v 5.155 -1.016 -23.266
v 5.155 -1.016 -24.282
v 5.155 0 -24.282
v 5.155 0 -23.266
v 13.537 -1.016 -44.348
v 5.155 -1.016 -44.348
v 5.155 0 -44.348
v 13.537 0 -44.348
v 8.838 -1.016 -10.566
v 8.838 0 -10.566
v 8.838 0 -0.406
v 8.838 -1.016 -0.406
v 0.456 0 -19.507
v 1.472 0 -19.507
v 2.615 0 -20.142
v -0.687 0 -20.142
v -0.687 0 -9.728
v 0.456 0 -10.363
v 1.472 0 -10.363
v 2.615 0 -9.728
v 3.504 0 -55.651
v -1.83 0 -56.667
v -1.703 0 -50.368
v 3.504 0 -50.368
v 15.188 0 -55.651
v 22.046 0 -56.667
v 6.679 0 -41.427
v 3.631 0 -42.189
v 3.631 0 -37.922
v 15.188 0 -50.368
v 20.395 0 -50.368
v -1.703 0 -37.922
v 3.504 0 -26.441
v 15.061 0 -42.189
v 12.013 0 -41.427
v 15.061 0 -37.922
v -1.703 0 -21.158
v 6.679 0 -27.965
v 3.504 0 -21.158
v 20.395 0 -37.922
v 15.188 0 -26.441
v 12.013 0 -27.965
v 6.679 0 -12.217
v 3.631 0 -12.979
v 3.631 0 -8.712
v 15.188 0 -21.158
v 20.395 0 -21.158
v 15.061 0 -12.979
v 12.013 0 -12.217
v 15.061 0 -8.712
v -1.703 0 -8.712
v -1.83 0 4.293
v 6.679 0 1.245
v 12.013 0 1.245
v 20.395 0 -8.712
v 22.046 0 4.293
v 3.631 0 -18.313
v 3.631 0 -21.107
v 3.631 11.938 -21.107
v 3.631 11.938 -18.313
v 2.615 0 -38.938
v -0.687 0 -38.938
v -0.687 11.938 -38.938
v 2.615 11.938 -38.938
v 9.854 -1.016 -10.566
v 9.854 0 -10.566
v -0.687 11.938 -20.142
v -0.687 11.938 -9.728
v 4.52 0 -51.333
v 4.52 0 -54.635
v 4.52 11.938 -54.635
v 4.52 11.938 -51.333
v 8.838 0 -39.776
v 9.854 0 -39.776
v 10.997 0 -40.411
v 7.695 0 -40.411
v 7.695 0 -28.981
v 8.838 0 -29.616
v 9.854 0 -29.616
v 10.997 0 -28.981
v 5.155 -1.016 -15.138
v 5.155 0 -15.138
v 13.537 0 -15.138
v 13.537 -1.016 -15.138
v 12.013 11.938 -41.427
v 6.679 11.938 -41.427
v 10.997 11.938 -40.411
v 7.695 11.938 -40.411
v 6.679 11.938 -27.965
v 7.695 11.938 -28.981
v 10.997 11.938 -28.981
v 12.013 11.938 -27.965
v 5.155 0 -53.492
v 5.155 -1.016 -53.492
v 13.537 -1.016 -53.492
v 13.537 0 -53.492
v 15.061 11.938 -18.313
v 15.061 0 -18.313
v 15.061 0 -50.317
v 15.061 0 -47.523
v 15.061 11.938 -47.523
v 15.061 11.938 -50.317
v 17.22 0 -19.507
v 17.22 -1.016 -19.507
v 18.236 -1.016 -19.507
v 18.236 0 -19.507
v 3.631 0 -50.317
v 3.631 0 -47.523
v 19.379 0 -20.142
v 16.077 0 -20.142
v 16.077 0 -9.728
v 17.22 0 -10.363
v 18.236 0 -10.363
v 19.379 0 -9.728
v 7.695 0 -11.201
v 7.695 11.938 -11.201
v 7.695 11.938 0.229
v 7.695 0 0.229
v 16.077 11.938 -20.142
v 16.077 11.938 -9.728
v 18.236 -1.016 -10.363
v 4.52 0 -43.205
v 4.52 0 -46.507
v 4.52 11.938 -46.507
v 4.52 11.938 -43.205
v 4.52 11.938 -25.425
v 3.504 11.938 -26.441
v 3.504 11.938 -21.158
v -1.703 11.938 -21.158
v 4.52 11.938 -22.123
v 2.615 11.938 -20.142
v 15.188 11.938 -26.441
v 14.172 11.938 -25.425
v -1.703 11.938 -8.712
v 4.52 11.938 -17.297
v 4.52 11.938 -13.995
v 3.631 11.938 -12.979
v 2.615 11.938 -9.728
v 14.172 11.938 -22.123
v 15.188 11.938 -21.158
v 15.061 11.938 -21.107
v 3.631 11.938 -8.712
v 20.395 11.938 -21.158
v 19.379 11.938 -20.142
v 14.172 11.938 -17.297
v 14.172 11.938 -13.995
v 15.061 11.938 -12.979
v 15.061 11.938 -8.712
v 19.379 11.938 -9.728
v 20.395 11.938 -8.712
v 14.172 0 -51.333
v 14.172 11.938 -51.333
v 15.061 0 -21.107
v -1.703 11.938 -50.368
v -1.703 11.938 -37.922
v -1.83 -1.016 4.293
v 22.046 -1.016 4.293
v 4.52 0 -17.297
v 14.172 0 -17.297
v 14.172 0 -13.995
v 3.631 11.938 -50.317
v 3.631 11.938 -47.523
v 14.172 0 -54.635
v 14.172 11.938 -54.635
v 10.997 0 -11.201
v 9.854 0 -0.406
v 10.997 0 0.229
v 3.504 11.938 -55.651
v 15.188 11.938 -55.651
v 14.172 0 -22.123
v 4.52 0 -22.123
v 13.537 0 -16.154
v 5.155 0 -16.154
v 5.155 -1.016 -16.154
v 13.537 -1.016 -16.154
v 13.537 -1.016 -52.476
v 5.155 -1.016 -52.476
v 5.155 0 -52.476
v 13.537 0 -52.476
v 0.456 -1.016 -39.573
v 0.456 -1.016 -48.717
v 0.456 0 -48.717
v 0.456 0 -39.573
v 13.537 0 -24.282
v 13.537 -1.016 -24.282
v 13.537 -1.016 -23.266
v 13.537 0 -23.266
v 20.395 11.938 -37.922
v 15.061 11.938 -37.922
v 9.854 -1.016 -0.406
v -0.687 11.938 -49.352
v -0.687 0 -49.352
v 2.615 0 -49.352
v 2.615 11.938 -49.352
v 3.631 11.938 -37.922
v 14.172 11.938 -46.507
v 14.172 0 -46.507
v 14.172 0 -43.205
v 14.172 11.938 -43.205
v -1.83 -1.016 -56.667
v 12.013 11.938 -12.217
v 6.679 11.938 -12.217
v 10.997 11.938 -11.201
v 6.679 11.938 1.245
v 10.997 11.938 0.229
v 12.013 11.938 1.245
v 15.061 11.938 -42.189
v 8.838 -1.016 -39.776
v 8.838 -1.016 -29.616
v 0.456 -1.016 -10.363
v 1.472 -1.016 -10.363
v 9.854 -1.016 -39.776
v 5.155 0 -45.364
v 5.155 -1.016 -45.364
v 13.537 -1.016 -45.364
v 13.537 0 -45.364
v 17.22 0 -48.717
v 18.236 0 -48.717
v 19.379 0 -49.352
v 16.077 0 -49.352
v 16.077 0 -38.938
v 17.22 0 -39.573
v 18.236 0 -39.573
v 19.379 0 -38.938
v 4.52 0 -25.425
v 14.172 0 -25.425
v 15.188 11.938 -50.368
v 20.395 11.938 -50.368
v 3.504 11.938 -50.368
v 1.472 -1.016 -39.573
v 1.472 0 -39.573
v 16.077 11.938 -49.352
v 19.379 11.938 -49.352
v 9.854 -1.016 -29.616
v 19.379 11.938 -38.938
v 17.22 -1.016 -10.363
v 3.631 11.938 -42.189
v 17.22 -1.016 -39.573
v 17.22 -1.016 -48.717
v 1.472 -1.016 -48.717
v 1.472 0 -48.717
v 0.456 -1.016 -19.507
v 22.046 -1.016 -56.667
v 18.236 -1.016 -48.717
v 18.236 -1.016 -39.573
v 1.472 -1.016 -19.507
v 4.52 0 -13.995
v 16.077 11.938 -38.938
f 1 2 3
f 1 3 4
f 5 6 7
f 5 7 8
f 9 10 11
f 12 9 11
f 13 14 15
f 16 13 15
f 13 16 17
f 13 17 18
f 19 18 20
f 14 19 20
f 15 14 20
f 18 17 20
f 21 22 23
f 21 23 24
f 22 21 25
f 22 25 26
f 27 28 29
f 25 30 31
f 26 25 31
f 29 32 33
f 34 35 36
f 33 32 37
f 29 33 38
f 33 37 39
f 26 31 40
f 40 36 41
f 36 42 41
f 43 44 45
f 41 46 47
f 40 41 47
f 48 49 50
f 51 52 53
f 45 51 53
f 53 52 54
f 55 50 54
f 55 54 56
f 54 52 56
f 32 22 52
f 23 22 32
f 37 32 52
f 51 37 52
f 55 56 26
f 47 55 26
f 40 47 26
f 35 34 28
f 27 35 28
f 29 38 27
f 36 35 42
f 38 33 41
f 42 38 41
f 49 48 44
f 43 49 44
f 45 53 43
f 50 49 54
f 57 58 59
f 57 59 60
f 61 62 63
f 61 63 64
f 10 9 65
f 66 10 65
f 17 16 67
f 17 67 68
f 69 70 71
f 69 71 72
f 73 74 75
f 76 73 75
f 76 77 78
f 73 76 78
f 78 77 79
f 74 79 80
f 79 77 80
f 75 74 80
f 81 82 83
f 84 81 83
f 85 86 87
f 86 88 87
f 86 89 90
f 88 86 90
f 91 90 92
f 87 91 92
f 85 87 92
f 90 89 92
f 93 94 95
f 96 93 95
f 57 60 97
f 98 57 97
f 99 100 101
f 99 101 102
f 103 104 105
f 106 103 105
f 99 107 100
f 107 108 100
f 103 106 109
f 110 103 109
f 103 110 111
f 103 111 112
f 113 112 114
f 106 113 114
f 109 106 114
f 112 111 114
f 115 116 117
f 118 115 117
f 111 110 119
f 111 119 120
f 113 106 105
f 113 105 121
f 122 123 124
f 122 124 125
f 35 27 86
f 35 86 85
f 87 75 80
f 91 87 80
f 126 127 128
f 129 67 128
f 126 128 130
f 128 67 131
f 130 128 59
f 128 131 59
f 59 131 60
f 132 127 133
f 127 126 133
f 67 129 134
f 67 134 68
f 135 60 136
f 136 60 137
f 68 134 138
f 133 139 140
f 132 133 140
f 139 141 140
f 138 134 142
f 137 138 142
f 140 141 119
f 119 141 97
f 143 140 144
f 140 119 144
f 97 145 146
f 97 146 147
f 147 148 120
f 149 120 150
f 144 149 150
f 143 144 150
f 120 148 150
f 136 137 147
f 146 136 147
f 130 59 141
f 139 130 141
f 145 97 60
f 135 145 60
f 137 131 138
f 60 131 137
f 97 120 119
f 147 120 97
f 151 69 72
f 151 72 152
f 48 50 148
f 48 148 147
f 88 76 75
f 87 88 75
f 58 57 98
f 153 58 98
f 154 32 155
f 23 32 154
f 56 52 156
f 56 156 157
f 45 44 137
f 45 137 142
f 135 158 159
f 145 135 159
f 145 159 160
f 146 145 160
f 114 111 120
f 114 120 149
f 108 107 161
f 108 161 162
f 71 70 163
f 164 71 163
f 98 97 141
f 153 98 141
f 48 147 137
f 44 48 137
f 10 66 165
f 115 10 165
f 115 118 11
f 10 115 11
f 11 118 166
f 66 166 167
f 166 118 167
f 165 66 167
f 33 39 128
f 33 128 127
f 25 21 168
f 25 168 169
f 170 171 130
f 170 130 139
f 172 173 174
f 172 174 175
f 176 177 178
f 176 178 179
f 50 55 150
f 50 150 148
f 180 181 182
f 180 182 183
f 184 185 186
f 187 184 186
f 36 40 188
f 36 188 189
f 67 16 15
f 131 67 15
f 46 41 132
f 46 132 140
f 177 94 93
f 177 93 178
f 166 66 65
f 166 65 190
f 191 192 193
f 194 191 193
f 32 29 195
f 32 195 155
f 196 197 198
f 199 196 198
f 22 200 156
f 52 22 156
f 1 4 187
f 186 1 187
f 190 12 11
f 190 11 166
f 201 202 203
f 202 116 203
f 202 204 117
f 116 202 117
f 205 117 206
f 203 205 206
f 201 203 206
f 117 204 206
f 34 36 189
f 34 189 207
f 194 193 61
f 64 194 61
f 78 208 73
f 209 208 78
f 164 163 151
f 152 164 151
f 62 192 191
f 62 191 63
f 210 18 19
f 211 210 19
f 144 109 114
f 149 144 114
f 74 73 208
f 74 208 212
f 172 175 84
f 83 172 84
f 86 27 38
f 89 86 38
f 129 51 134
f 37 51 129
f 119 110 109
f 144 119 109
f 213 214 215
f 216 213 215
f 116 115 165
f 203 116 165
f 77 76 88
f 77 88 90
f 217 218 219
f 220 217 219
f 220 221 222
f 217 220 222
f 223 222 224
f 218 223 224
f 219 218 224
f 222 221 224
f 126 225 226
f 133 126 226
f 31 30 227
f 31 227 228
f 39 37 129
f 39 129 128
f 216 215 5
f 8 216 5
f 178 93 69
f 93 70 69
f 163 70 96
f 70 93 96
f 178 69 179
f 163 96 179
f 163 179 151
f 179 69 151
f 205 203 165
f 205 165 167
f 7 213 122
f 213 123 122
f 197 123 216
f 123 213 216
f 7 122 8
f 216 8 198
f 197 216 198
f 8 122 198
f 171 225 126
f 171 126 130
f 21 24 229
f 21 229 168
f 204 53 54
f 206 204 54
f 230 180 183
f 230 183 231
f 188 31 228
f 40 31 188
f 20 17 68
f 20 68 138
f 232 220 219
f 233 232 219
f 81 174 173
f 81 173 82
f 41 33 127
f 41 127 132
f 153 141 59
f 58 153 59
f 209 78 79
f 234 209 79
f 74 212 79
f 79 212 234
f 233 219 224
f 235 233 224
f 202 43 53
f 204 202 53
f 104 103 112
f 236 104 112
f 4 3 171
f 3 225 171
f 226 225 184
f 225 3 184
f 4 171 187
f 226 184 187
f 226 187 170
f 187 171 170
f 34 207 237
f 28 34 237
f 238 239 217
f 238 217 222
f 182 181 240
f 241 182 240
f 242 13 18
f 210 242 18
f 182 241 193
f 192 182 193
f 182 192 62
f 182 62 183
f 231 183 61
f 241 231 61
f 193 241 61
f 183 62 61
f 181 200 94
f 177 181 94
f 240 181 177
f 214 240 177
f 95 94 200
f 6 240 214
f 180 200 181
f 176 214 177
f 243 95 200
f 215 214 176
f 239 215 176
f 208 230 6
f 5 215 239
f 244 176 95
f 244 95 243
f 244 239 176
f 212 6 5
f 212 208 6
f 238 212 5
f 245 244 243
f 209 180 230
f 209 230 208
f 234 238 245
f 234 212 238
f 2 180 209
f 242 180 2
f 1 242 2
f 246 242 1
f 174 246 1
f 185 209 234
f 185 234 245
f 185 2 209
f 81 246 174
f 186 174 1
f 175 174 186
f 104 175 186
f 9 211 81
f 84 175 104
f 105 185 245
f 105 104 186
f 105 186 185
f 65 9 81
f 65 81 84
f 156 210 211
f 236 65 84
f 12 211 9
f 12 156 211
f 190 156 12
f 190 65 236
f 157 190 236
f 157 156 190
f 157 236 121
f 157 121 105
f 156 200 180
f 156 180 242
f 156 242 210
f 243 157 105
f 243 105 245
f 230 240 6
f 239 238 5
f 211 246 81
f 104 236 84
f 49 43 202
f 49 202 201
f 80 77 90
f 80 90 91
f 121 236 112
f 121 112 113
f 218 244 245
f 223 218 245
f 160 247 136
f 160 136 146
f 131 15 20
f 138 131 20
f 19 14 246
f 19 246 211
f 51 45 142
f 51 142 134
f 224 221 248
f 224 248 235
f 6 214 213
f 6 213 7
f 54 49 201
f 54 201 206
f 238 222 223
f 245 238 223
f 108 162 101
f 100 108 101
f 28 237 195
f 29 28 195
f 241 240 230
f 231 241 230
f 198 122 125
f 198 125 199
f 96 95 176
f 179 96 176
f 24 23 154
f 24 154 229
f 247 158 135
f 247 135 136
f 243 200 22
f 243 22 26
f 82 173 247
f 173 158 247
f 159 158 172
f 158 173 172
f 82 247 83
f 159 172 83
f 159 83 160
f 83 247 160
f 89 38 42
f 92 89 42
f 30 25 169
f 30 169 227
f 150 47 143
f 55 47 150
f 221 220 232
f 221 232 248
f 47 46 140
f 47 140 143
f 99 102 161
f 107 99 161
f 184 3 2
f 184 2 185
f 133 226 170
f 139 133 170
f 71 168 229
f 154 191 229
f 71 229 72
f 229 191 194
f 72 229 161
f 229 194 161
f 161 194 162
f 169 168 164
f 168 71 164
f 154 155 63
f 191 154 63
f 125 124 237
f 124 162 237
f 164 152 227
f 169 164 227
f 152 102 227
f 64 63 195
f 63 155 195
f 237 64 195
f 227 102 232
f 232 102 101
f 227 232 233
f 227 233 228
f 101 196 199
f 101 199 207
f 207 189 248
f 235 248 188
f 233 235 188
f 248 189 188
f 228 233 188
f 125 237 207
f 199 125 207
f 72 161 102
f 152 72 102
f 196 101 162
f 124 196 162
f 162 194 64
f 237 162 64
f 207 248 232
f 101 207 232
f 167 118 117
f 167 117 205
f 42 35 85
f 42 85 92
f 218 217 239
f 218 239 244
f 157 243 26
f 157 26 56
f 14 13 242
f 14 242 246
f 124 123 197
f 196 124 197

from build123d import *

# Parameters (mm, degrees)
F0_W      = 25.4
F0_H      = 30.48
F1_DEPTH  = 1.016
F2_W      = 1.016
F2_H      = 10.16
F2_H_2    = 9.144
F2_W_2    = 8.382
F2_H_3    = 1.016
F3_DEPTH  = 1.017
F4_W      = 25.4
F4_H      = 30.48
F5_DEPTH  = 1.016
F6_W      = 1.016
F6_H      = 9.144
F6_W_2    = 8.382
F6_H_2    = 1.016
F6_H_3    = 10.16
F7_DEPTH  = 1.017
F8_W      = 5.334
F8_H      = 13.462
F8_W_2    = 3.302
F8_H_2    = 11.43
F8_H_3    = 10.414
F8_W_3    = 11.43
F8_H_4    = 5.334
F8_W_4    = 9.652
F8_H_5    = 3.302
F8_W_5    = 0.127
F8_H_6    = 0.0508
F9_DEPTH  = 12.954
F10_W     = 1.524
F10_H     = 60.96
F11_DEPTH = 25.4


with BuildPart() as f1:
    # F0 (on Front) → F1 (new body)
    with BuildSketch(Plane.XZ):
        with Locations((9.3459782816, -10.94705052)):
            Rectangle(F0_W, F0_H)
    extrude(amount=F1_DEPTH)

    # F2 (on Front) → F3 (cut, through all)
    with BuildSketch(Plane.XZ):
        with Locations((9.3459782816, -5.48605052)):
            Rectangle(F2_W, F2_H)
        with Locations((0.9639782816, -14.93485052)):
            Rectangle(F2_W, F2_H_2)
        with Locations((17.7279782816, -14.93485052)):
            Rectangle(F2_W, F2_H_2)
        with Locations((9.3459782816, -15.64605052)):
            Rectangle(F2_W_2, F2_H_3)
        with Locations((9.3459782816, -23.77405052)):
            Rectangle(F2_W_2, F2_H_3)
    extrude(amount=F3_DEPTH, mode=Mode.SUBTRACT)

    # F4 (on face) → F5 (join)
    with BuildSketch(Plane.XZ.offset(1.016)):
        with Locations((9.3459782816, -41.42705052)):
            Rectangle(F4_W, F4_H)
    extrude(amount=-F5_DEPTH)

    # F6 (on face) → F7 (cut, through all)
    with BuildSketch(Plane.XZ.offset(1.016)):
        with Locations((0.9639782816, -14.93485052)):
            Rectangle(F6_W, F6_H)
        with Locations((9.3459782816, -15.64605052)):
            Rectangle(F6_W_2, F6_H_2)
        with Locations((9.3459782816, -5.48605052)):
            Rectangle(F6_W, F6_H_3)
        with Locations((17.7279782816, -14.93485052)):
            Rectangle(F6_W, F6_H)
        with Locations((9.3459782816, -23.77405052)):
            Rectangle(F6_W_2, F6_H_2)
        with Locations((9.3459782816, -34.69605052)):
            Rectangle(F6_W, F6_H_3)
        with Locations((17.7279782816, -44.14485052)):
            Rectangle(F6_W, F6_H)
        with Locations((9.3459782816, -44.85605052)):
            Rectangle(F6_W_2, F6_H_2)
        with Locations((9.3459782816, -52.98405052)):
            Rectangle(F6_W_2, F6_H_2)
        with Locations((0.9639782816, -44.14485052)):
            Rectangle(F6_W, F6_H)
    extrude(amount=-F7_DEPTH, mode=Mode.SUBTRACT)

    # F8 (on face) → F9 (join)
    with BuildSketch(Plane.XZ.offset(1.016)):
        with Locations((9.3459782816, -5.48605052)):
            Rectangle(F8_W, F8_H)
        with Locations((9.3459782816, -5.48605052)):
            Rectangle(F8_W_2, F8_H_2, mode=Mode.SUBTRACT)
        Polygon((3.6309782816, -12.97905052), (3.6309782816, -8.71185052), (-1.7030217184, -8.71185052), (-1.7030217184, -21.15785052), (3.5039782816, -21.15785052), (3.5039782816, -21.10705052), (3.6309782816, -21.10705052), (3.6309782816, -18.31305052), (3.5039782816, -18.31305052), (3.5039782816, -12.97905052), align=None)
        with Locations((0.9639782816, -14.93485052)):
            Rectangle(F8_W_2, F8_H_3, mode=Mode.SUBTRACT)
        with Locations((9.3459782816, -15.64605052)):
            Rectangle(F8_W_3, F8_H_4)
        with Locations((9.3459782816, -15.64605052)):
            Rectangle(F8_W_4, F8_H_5, mode=Mode.SUBTRACT)
        with Locations((3.5674782816, -15.64605052)):
            Rectangle(F8_W_5, F8_H_4)
        with Locations((15.1244782816, -15.64605052)):
            Rectangle(F8_W_5, F8_H_4)
        Polygon((15.0609782816, -8.71185052), (15.0609782816, -12.97905052), (15.1879782816, -12.97905052), (15.1879782816, -18.31305052), (15.0609782816, -18.31305052), (15.0609782816, -21.10705052), (15.1879782816, -21.10705052), (15.1879782816, -21.15785052), (20.3949782816, -21.15785052), (20.3949782816, -8.71185052), align=None)
        with Locations((17.7279782816, -14.93485052)):
            Rectangle(F8_W_2, F8_H_3, mode=Mode.SUBTRACT)
        with Locations((3.5674782816, -21.13245052)):
            Rectangle(F8_W_5, F8_H_6)
        Polygon((3.6309782816, -21.15785052), (3.5039782816, -21.15785052), (3.5039782816, -26.44105052), (15.1879782816, -26.44105052), (15.1879782816, -21.15785052), (15.0609782816, -21.15785052), (15.0609782816, -21.10705052), (3.6309782816, -21.10705052), align=None)
        with Locations((9.3459782816, -23.77405052)):
            Rectangle(F8_W_4, F8_H_5, mode=Mode.SUBTRACT)
        with Locations((15.1244782816, -21.13245052)):
            Rectangle(F8_W_5, F8_H_6)
        with Locations((9.3459782816, -34.69605052)):
            Rectangle(F8_W, F8_H)
        with Locations((9.3459782816, -34.69605052)):
            Rectangle(F8_W_2, F8_H_2, mode=Mode.SUBTRACT)
        Polygon((20.3949782816, -37.92185052), (15.0609782816, -37.92185052), (15.0609782816, -42.18905052), (15.1879782816, -42.18905052), (15.1879782816, -47.52305052), (15.0609782816, -47.52305052), (15.0609782816, -50.31705052), (15.1879782816, -50.31705052), (15.1879782816, -50.36785052), (20.3949782816, -50.36785052), align=None)
        with Locations((17.7279782816, -44.14485052)):
            Rectangle(F8_W_2, F8_H_3, mode=Mode.SUBTRACT)
        with Locations((15.1244782816, -44.85605052)):
            Rectangle(F8_W_5, F8_H_4)
        with Locations((9.3459782816, -44.85605052)):
            Rectangle(F8_W_3, F8_H_4)
        with Locations((9.3459782816, -44.85605052)):
            Rectangle(F8_W_4, F8_H_5, mode=Mode.SUBTRACT)
        with Locations((3.5674782816, -44.85605052)):
            Rectangle(F8_W_5, F8_H_4)
        Polygon((3.5039782816, -42.18905052), (3.6309782816, -42.18905052), (3.6309782816, -37.92185052), (-1.7030217184, -37.92185052), (-1.7030217184, -50.36785052), (3.5039782816, -50.36785052), (3.5039782816, -50.31705052), (3.6309782816, -50.31705052), (3.6309782816, -47.52305052), (3.5039782816, -47.52305052), align=None)
        with Locations((0.9639782816, -44.14485052)):
            Rectangle(F8_W_2, F8_H_3, mode=Mode.SUBTRACT)
        with Locations((15.1244782816, -50.34245052)):
            Rectangle(F8_W_5, F8_H_6)
        Polygon((15.0609782816, -50.36785052), (15.0609782816, -50.31705052), (3.6309782816, -50.31705052), (3.6309782816, -50.36785052), (3.5039782816, -50.36785052), (3.5039782816, -55.65105052), (15.1879782816, -55.65105052), (15.1879782816, -50.36785052), align=None)
        with Locations((9.3459782816, -52.98405052)):
            Rectangle(F8_W_4, F8_H_5, mode=Mode.SUBTRACT)
        with Locations((3.5674782816, -50.34245052)):
            Rectangle(F8_W_5, F8_H_6)
    extrude(amount=-F9_DEPTH)

    # F10 (on face) → F11 (cut)
    with BuildSketch(Plane.XZ.offset(1.016)):
        with Locations((-2.5920217184, -26.18705052)):
            Rectangle(F10_W, F10_H)
    extrude(amount=-F11_DEPTH, mode=Mode.SUBTRACT)


solid = f1.part
